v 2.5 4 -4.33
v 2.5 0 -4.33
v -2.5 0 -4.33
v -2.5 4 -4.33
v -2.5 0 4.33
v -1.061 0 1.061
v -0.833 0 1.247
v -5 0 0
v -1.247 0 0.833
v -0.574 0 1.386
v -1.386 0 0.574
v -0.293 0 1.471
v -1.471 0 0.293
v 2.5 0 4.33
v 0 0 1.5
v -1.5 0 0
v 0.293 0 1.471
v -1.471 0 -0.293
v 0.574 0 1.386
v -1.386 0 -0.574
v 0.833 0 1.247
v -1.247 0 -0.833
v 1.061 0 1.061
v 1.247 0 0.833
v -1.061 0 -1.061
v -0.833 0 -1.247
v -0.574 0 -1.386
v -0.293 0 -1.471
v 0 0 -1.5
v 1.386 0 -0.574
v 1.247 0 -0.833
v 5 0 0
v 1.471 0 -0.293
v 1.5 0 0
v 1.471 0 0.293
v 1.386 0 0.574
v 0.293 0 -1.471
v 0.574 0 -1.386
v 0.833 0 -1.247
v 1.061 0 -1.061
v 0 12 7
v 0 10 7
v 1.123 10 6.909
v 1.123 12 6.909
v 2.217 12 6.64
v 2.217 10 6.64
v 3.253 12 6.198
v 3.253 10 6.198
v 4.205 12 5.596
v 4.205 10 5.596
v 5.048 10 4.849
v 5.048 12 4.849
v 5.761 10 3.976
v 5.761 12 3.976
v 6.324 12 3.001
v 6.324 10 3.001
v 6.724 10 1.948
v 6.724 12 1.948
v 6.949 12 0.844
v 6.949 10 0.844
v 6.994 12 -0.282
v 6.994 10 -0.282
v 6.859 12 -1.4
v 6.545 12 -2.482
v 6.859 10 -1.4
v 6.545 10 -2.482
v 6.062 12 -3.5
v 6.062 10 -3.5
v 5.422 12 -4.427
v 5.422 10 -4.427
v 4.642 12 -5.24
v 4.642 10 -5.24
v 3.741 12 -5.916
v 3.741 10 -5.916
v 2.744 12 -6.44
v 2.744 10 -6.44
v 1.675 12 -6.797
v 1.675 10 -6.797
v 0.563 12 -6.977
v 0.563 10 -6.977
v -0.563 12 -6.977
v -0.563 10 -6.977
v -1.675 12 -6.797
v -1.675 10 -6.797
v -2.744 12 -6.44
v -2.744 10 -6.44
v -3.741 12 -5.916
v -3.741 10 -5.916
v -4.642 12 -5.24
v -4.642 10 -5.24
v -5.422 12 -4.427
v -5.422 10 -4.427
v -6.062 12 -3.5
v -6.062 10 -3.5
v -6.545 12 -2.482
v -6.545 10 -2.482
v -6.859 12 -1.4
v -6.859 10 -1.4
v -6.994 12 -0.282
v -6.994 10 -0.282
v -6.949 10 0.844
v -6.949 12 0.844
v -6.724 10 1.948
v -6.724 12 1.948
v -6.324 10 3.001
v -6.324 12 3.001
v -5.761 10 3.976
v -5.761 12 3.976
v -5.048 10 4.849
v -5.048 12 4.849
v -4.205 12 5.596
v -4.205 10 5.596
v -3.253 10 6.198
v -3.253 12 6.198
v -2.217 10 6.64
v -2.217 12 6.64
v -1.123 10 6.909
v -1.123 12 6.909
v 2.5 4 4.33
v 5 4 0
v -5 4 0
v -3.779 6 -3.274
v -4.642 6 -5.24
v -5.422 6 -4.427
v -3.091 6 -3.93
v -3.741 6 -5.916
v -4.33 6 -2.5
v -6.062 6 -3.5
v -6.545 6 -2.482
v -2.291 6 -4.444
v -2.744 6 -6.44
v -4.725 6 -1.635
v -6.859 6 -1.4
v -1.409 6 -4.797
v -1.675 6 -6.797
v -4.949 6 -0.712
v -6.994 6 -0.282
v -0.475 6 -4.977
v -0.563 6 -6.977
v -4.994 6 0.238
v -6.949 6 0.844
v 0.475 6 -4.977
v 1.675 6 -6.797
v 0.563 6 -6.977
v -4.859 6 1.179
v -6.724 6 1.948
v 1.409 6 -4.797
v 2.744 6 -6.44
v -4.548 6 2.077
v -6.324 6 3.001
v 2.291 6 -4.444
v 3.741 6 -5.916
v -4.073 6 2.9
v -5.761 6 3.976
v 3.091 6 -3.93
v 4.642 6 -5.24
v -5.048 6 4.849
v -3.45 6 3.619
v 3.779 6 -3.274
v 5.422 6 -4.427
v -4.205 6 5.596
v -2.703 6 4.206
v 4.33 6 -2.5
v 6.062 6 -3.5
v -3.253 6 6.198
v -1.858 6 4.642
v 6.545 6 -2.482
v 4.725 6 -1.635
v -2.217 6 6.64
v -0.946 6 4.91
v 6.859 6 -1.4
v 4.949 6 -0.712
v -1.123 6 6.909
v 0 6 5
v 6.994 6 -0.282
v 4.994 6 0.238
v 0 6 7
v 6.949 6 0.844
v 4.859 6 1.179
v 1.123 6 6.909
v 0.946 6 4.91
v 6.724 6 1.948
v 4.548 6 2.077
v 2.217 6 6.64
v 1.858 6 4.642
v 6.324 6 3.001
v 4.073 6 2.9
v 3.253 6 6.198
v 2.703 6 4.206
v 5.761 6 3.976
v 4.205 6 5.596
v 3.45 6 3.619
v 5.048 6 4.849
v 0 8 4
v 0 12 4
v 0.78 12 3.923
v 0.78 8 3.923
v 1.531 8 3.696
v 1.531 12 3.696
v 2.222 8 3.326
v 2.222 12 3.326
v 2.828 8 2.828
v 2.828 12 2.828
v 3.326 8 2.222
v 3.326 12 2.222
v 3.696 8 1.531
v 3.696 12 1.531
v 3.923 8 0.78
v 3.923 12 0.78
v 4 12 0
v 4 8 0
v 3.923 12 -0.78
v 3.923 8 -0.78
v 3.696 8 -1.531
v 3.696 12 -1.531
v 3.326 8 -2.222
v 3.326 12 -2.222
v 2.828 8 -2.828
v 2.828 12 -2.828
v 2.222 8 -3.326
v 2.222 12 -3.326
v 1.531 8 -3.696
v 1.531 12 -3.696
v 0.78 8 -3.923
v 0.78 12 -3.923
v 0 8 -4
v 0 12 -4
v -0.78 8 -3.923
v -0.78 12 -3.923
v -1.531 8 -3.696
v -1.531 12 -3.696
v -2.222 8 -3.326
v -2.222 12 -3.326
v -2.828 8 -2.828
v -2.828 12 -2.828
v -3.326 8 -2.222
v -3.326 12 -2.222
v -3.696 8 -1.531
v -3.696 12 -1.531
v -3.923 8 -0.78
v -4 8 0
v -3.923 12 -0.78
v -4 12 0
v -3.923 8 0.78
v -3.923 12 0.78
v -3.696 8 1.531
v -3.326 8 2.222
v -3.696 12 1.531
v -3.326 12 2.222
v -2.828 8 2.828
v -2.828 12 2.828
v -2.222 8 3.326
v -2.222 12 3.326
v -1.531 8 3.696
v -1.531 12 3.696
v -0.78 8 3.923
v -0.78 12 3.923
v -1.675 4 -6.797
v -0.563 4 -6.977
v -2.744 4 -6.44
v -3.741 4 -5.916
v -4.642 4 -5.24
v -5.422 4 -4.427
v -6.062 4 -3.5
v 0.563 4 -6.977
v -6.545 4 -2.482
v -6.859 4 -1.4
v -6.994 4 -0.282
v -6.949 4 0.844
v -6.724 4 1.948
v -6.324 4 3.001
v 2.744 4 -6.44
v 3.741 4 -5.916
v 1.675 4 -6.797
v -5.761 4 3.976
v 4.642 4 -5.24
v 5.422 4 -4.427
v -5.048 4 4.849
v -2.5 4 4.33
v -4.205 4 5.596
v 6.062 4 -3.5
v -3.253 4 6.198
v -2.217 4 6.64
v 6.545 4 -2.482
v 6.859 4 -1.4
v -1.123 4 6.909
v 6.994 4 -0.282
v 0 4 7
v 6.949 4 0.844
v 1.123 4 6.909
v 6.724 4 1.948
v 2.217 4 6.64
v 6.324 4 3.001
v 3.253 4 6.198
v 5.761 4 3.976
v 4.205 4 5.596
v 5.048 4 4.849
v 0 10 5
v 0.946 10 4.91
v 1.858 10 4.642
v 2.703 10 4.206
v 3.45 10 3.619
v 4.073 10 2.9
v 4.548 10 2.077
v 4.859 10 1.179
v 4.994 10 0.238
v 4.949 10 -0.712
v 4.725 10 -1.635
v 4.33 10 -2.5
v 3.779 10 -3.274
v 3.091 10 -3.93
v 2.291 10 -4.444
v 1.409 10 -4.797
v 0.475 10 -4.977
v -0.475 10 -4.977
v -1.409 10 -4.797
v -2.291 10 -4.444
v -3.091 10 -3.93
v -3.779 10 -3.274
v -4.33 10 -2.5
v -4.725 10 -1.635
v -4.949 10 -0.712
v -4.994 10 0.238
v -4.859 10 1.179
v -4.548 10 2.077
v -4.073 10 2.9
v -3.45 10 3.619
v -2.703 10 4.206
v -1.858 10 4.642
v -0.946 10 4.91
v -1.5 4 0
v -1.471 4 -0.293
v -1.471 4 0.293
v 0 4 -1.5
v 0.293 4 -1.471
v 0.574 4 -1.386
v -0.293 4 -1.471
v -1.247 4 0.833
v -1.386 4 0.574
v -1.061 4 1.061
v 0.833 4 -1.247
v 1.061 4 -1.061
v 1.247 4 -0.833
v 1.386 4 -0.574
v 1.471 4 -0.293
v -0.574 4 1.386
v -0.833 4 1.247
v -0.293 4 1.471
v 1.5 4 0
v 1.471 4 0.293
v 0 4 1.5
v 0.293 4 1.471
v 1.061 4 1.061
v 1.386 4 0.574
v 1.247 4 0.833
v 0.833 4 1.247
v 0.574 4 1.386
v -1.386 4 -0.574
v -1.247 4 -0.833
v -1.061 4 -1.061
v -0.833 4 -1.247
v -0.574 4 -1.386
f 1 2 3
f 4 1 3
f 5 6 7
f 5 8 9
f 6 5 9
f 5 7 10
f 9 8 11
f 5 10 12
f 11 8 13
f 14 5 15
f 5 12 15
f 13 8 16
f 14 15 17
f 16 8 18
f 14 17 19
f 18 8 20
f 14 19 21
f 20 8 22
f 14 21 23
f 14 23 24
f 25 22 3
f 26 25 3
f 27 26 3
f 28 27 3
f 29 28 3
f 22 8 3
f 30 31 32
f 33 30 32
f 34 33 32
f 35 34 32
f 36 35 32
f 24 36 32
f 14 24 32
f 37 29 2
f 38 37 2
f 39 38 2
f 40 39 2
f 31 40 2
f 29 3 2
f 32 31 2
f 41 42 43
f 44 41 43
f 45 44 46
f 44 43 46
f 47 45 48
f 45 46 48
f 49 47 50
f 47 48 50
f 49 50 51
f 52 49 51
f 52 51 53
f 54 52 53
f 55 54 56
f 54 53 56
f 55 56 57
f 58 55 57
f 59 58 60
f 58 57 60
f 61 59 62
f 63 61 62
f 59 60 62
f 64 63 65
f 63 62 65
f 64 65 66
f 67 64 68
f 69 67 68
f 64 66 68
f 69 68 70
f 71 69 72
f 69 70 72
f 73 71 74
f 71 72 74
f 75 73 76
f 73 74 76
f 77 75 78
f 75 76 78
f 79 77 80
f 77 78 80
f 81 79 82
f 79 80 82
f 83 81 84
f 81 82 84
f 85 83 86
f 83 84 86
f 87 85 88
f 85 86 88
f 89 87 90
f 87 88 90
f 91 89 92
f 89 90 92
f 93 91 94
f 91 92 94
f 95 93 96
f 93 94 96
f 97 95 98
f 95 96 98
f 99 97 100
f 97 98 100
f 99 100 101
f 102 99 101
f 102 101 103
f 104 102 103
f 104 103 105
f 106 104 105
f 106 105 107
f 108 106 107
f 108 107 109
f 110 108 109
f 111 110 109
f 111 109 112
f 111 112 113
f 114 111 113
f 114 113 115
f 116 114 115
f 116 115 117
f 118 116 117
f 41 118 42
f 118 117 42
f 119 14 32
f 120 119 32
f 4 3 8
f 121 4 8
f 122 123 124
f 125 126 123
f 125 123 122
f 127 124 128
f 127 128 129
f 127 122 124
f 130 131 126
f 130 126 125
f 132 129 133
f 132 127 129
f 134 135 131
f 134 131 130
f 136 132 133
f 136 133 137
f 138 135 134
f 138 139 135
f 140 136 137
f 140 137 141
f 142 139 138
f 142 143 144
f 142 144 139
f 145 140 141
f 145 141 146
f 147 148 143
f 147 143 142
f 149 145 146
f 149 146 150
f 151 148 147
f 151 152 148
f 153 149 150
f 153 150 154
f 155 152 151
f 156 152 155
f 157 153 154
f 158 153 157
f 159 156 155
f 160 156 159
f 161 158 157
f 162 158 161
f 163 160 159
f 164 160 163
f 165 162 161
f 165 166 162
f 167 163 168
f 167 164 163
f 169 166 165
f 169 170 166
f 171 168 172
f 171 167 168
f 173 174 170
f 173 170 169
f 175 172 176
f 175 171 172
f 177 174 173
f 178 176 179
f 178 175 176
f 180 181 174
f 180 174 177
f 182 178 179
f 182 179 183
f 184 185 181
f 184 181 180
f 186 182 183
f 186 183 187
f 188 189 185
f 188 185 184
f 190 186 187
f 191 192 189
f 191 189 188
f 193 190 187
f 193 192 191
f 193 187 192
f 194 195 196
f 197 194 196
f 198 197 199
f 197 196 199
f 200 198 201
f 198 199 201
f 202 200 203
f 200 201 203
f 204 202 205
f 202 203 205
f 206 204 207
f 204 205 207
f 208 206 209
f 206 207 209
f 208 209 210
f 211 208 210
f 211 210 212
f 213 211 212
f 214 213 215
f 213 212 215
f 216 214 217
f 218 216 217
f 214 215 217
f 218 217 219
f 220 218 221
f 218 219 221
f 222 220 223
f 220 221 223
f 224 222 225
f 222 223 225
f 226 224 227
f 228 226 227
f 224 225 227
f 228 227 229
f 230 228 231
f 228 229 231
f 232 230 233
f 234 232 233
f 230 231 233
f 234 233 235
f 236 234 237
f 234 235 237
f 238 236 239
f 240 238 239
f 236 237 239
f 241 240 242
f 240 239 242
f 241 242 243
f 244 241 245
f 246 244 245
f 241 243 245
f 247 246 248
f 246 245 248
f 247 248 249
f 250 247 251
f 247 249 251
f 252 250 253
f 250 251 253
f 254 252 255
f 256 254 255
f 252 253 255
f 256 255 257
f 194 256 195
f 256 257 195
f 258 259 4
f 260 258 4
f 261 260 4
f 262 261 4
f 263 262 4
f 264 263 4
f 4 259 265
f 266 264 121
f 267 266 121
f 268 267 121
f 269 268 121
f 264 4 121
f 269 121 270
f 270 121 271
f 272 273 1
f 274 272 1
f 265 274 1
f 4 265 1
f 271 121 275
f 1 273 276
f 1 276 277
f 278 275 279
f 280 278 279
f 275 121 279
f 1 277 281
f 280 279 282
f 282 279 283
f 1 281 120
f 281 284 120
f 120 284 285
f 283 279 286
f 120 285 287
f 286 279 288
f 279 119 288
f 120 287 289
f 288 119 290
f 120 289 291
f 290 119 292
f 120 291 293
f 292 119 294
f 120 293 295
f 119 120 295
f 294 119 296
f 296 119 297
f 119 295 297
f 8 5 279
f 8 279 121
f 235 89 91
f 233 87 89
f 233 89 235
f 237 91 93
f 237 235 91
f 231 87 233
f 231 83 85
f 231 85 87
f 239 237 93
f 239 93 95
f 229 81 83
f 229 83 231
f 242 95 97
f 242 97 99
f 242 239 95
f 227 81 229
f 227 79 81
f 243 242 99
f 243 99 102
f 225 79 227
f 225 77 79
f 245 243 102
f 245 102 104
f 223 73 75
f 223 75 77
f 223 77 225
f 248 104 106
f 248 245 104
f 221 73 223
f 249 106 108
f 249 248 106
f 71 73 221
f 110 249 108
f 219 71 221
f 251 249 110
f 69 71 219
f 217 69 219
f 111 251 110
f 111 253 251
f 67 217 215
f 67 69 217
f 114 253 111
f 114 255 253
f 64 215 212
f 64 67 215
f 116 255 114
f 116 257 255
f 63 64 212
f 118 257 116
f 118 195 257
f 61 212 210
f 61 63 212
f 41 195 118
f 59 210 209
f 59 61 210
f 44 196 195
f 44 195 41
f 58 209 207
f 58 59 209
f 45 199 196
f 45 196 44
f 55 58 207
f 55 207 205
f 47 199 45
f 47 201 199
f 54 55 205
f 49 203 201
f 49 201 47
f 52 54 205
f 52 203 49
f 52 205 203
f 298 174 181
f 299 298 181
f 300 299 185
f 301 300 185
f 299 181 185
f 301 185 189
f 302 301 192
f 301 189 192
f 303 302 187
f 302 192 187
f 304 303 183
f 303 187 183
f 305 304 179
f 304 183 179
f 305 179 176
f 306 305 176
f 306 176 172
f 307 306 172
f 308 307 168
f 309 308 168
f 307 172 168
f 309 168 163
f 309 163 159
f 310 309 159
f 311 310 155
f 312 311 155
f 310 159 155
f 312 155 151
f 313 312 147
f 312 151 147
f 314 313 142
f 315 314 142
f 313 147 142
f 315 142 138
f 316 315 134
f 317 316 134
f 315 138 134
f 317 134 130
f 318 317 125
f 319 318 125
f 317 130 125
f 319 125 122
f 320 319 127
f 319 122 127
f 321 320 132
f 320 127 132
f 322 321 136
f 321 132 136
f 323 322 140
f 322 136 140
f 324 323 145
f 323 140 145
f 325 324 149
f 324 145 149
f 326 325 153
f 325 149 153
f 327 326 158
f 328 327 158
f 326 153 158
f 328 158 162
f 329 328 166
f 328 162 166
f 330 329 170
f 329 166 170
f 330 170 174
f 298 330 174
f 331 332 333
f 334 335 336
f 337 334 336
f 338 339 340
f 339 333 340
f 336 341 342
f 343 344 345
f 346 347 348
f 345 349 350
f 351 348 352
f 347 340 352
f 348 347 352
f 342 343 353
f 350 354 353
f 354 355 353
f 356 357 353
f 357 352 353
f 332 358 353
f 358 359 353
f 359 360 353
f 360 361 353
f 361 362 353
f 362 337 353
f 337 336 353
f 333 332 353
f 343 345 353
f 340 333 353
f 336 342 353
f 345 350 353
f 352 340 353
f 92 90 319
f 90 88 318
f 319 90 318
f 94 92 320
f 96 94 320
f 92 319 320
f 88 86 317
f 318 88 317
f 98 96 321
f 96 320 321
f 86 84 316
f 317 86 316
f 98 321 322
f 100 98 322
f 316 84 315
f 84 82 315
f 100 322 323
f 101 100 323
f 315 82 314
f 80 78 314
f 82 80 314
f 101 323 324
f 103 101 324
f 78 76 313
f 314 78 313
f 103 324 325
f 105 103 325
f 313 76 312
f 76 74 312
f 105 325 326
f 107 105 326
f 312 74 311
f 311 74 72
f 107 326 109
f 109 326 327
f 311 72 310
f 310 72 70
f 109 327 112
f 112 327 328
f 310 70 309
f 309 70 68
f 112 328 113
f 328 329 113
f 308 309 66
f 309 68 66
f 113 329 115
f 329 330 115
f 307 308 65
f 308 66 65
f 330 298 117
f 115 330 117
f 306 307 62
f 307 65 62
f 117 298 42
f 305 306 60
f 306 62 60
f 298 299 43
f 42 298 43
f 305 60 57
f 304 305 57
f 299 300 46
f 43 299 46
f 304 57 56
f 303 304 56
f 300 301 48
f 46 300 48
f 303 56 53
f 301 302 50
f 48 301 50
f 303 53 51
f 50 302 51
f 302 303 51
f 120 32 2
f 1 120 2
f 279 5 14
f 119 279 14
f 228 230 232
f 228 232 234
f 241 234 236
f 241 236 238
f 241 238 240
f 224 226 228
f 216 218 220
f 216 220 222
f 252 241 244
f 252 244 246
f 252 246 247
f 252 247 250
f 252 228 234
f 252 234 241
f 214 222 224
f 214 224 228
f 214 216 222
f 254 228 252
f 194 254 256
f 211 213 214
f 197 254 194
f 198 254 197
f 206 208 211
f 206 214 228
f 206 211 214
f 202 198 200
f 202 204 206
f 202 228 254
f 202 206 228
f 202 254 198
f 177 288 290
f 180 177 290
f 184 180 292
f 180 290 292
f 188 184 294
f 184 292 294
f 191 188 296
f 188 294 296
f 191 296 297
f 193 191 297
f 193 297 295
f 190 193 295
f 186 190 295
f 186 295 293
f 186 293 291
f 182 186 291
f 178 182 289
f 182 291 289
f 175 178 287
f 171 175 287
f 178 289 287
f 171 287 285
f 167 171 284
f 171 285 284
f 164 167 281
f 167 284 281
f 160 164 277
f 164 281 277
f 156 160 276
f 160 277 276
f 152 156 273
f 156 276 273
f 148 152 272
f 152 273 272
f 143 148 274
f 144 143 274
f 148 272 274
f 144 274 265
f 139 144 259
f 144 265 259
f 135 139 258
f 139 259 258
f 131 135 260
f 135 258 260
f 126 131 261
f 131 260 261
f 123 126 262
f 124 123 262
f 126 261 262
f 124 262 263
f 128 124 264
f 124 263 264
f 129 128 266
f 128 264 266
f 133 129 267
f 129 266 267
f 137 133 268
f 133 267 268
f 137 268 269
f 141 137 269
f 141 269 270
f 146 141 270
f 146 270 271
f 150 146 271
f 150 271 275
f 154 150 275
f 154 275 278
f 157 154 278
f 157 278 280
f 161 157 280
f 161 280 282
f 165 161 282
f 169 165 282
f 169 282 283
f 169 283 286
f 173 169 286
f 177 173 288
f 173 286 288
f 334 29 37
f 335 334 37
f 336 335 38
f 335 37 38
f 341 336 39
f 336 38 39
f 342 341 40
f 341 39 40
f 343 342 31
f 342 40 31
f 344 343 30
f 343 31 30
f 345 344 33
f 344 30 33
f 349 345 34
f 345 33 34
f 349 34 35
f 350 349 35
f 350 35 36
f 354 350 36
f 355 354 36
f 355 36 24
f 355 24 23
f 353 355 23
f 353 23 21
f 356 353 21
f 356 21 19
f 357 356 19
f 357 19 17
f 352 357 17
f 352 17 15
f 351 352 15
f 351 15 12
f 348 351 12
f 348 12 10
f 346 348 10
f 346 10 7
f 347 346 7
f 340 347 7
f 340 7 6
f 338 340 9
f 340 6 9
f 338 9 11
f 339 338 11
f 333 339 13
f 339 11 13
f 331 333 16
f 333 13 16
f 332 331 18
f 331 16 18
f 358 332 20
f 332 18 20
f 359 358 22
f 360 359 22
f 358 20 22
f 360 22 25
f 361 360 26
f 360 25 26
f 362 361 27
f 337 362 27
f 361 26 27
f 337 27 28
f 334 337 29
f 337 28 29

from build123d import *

# Parameters (mm, degrees)
EXTRUDE_1_DEPTH     = 4
SKETCH_4_R          = 1.5
CUT_EXTRUDE_1_DEPTH = 15
SKETCH_3_R          = 7
EXTRUDE_4_DEPTH     = 2
SKETCH_10_R         = 5
EXTRUDE_7_DEPTH     = 4
SKETCH_11_R         = 7
EXTRUDE_8_DEPTH     = 2
SKETCH_12_R         = 4
CUT_EXTRUDE_5_DEPTH = 4


with BuildPart() as part:
    # 草图2 → 凸台-拉伸1 (new body)
    with BuildSketch(Plane(origin=(0, 0, 0), x_dir=(1, 0, 0), z_dir=(0, 1, 0))):
        Polygon((0, 0), (-2.5, 4.330127019), (-5, 0), align=None)
        Polygon((-2.5, -4.330127019), (-5, 0), (0, 0), align=None)
        Polygon((0, 0), (-2.5, -4.330127019), (2.5, -4.330127019), align=None)
        Polygon((0, 0), (2.5, -4.330127019), (5, 0), align=None)
        Polygon((0, 0), (5, 0), (2.5, 4.330127019), align=None)
        Polygon((0, 0), (2.5, 4.330127019), (-2.5, 4.330127019), align=None)
    extrude(amount=EXTRUDE_1_DEPTH)

    # 草图4 → 切除-拉伸1 (cut)
    with BuildSketch(Plane.XZ):
        with Locations(Location((0, 0, 0), (0, 0, 270))):
            Circle(SKETCH_4_R)
    extrude(amount=-CUT_EXTRUDE_1_DEPTH, mode=Mode.SUBTRACT)

    # 草图3 → 凸台-拉伸4 (add)
    with BuildSketch(Plane(origin=(0, 4, 0), x_dir=(1, 0, 0), z_dir=(0, 1, 0))):
        with Locations(Location((0, 0, 0), (0, 0, 270))):
            Circle(SKETCH_3_R)
    extrude(amount=EXTRUDE_4_DEPTH)

    # 草图10 → 凸台-拉伸7 (add)
    with BuildSketch(Plane(origin=(0, 6, 0), x_dir=(1, 0, 0), z_dir=(0, 1, 0))):
        with Locations(Location((0, 0, 0), (0, 0, 270))):
            Circle(SKETCH_10_R)
    extrude(amount=EXTRUDE_7_DEPTH)

    # 草图11 → 凸台-拉伸8 (add)
    with BuildSketch(Plane(origin=(0, 10, 0), x_dir=(1, 0, 0), z_dir=(0, 1, 0))):
        with Locations(Location((0, 0, 0), (0, 0, 270))):
            Circle(SKETCH_11_R)
    extrude(amount=EXTRUDE_8_DEPTH)

    # 草图12 → 切除-拉伸5 (cut)
    with BuildSketch(Plane(origin=(0, 12, 0), x_dir=(1, 0, 0), z_dir=(0, 1, 0))):
        with Locations(Location((0, 0, 0), (0, 0, 270))):
            Circle(SKETCH_12_R)
    extrude(amount=-CUT_EXTRUDE_5_DEPTH, mode=Mode.SUBTRACT)


solid = part.part
